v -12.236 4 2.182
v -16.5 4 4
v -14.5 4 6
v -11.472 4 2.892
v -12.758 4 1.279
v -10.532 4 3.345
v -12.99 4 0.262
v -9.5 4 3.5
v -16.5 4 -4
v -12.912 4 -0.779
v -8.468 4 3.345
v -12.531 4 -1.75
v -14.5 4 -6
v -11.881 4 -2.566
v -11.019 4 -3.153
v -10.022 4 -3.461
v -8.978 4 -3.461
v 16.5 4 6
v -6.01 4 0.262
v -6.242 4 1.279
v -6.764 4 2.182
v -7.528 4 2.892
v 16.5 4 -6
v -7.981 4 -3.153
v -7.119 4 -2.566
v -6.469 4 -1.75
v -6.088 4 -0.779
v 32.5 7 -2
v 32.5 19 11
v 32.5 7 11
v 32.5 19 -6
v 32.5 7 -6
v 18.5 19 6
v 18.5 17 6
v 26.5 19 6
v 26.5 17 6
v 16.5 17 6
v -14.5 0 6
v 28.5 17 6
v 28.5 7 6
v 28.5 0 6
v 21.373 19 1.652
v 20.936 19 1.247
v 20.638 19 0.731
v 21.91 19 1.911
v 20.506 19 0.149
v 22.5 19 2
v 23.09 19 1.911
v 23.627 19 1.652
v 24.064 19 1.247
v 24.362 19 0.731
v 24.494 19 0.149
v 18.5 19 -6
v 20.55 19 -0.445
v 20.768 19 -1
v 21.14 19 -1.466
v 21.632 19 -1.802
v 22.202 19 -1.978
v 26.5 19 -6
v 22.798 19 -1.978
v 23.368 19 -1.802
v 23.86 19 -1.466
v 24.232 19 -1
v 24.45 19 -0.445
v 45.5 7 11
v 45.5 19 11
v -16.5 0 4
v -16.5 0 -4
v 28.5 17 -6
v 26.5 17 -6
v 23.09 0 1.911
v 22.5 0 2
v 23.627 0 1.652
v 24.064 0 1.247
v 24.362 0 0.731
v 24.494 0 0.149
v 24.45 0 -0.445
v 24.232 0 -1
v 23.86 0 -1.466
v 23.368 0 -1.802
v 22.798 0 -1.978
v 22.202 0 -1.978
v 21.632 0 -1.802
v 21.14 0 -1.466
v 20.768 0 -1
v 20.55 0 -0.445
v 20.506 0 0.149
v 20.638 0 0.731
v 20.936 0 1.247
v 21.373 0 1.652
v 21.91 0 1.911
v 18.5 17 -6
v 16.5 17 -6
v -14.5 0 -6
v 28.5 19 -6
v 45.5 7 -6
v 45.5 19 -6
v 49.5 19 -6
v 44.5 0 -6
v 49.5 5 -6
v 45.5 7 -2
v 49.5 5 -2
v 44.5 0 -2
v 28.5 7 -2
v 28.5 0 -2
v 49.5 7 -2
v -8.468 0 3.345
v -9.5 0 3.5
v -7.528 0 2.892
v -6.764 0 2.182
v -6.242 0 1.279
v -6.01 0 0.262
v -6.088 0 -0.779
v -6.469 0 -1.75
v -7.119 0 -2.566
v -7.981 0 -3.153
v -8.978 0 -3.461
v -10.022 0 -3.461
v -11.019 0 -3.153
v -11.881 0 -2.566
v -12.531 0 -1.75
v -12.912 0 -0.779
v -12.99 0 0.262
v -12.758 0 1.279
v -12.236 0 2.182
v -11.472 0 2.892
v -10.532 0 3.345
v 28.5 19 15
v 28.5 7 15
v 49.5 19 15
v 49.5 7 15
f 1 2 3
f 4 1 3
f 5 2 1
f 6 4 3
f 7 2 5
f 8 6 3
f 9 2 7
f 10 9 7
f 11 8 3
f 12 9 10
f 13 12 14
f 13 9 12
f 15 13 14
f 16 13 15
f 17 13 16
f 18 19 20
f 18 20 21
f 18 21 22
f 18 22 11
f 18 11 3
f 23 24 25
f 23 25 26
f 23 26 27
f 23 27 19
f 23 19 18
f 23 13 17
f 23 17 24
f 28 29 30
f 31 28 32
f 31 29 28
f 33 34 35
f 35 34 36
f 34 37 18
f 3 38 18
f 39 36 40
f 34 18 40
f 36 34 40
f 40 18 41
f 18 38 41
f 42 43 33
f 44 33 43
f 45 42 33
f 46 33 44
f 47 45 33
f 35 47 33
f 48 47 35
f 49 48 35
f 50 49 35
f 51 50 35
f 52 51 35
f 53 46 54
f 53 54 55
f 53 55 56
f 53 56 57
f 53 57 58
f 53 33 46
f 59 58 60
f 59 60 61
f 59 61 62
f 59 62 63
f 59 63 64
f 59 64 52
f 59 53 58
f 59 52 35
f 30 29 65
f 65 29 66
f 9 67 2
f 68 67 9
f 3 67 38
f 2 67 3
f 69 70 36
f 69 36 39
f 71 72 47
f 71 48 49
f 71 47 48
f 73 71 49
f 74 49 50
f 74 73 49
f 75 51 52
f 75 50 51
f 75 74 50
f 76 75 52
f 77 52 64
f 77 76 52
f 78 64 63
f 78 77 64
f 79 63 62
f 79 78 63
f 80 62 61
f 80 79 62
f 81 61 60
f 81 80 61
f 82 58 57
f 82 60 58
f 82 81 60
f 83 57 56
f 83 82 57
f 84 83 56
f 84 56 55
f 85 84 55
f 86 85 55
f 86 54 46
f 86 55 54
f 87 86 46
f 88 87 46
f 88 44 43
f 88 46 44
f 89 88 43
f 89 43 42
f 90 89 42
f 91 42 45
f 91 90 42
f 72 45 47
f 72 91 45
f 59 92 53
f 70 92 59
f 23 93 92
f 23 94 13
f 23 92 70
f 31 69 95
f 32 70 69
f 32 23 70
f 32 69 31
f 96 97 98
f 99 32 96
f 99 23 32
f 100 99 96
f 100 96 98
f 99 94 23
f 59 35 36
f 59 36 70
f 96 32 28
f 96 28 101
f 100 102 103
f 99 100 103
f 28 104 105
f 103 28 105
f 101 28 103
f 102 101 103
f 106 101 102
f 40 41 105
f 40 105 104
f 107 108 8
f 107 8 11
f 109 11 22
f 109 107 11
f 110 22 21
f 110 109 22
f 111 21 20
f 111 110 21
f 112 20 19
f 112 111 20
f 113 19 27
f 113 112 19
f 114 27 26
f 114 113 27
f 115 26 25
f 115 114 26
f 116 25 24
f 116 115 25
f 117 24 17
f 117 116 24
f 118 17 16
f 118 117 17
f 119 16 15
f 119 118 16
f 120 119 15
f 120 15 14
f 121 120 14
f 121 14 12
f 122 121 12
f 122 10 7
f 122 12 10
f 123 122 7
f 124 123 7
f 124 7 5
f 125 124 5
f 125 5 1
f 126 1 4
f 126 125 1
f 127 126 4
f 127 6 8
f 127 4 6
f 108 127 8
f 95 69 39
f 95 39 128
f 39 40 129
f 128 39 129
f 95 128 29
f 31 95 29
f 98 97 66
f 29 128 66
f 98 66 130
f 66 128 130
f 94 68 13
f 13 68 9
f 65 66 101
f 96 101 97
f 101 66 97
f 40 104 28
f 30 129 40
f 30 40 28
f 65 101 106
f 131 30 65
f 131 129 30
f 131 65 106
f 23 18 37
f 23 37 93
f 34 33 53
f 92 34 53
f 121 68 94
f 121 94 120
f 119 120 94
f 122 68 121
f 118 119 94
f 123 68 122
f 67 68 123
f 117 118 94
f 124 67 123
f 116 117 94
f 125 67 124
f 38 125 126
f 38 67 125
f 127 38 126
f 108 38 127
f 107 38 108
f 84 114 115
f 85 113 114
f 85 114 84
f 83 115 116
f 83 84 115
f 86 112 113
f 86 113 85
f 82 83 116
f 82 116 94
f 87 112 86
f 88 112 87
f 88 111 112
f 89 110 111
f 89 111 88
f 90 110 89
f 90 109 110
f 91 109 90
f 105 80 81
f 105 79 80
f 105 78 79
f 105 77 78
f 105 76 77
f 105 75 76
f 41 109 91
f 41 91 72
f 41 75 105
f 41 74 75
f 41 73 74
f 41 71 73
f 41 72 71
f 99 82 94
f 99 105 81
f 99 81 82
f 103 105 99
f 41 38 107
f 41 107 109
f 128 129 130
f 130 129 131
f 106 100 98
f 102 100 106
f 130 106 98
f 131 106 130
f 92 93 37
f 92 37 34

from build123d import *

# Parameters (mm, degrees)
SKETCH_1_W               = 33
SKETCH_1_H               = 12
EXTRUDE_1_DEPTH          = 4
SKETCH_1_3_W             = 12
SKETCH_1_3_H             = 12
EXTRUDE_2_DEPTH          = 19
SKETCH_2_W               = 2
SKETCH_2_H               = 12
CUT_EXTRUDE_1_DEPTH      = 2
SKETCH_3_W               = 21
SKETCH_3_H               = 21
EXTRUDE_3_DEPTH          = 19
CUT_EXTRUDE_2_DEPTH      = 58.028501646
SKETCH_5_W               = 13
SKETCH_5_H               = 13
CUT_EXTRUDE_3_DEPTH      = 56.102177815
SKETCH_6_W               = 13
SKETCH_6_H               = 4
CUT_EXTRUDE_4_DEPTH      = 12
SKETCH_7_W               = 21
SKETCH_7_H               = 7
CUT_EXTRUDE_5_DEPTH      = 17
CUT_EXTRUDE_6_DEPTH      = 54.853969213
CUT_EXTRUDE_6_DEPTH_BACK = 54.853969213
SKETCH_8_R               = 3.5
CUT_EXTRUDE_7_DEPTH      = 56.102177815
CUT_EXTRUDE_7_DEPTH_BACK = 56.102177815
SKETCH_9_R               = 2
CHAMFER_1_SIZE           = 2


with BuildPart() as part:
    # 草图1 → 凸台-拉伸1 (new body)
    with BuildSketch(Plane(origin=(0, 0, 0), x_dir=(1, 0, 0), z_dir=(0, 1, 0))):
        Rectangle(SKETCH_1_W, SKETCH_1_H)
    extrude(amount=EXTRUDE_1_DEPTH)

    # 草图1<3> → 凸台-拉伸2 (add)
    with BuildSketch(Plane(origin=(0, 0, 0), x_dir=(1, 0, 0), z_dir=(0, 1, 0))):
        with Locations((22.5, 0)):
            Rectangle(SKETCH_1_3_W, SKETCH_1_3_H)
    extrude(amount=EXTRUDE_2_DEPTH)

    # 草图2 → 切除-拉伸1 (cut)
    with BuildSketch(Plane(origin=(0, 19, 0), x_dir=(1, 0, 0), z_dir=(0, 1, 0))):
        with Locations((17.5, 0)):
            Rectangle(SKETCH_2_W, SKETCH_2_H)
        with Locations((27.5, 0)):
            Rectangle(SKETCH_2_W, SKETCH_2_H)
    extrude(amount=-CUT_EXTRUDE_1_DEPTH, mode=Mode.SUBTRACT)

    # 草图3 → 凸台-拉伸3 (add)
    with BuildSketch(Plane.XZ):
        with Locations((39, 4.5)):
            Rectangle(SKETCH_3_W, SKETCH_3_H)
    extrude(amount=-EXTRUDE_3_DEPTH)

    # 草图4 → 切除-拉伸2 (cut, through all)
    with BuildSketch(Plane.XY.offset(15)):
        Polygon((49.5, 5), (44.5, 0), (49.5, 0), align=None)
    extrude(amount=-CUT_EXTRUDE_2_DEPTH, mode=Mode.SUBTRACT)

    # 草图5 → 切除-拉伸3 (cut, through all)
    with BuildSketch(Plane(origin=(0, 19, 0), x_dir=(1, 0, 0), z_dir=(0, 1, 0))):
        with Locations((39, -4.5)):
            Rectangle(SKETCH_5_W, SKETCH_5_H)
    extrude(amount=-CUT_EXTRUDE_3_DEPTH, mode=Mode.SUBTRACT)

    # 草图6 → 切除-拉伸4 (cut)
    with BuildSketch(Plane(origin=(0, 19, 0), x_dir=(1, 0, 0), z_dir=(0, 1, 0))):
        with Locations((39, 4)):
            Rectangle(SKETCH_6_W, SKETCH_6_H)
    extrude(amount=-CUT_EXTRUDE_4_DEPTH, mode=Mode.SUBTRACT)

    # 草图7 → 切除-拉伸5 (cut)
    with BuildSketch(Plane.XY.offset(15)):
        with Locations((39, 3.5)):
            Rectangle(SKETCH_7_W, SKETCH_7_H)
    extrude(amount=-CUT_EXTRUDE_5_DEPTH, mode=Mode.SUBTRACT)

    # 草图8 → 切除-拉伸6 (cut, two sides: drawn at the far end of the back side and taken through both)
    with BuildSketch(Plane(origin=(0, 4, 0), x_dir=(1, 0, 0), z_dir=(0, 1, 0)).offset(-CUT_EXTRUDE_6_DEPTH_BACK)):
        with Locations(Location((-9.5, 0, 0), (0, 0, 270))):
            Circle(SKETCH_8_R)
    extrude(amount=CUT_EXTRUDE_6_DEPTH + CUT_EXTRUDE_6_DEPTH_BACK, mode=Mode.SUBTRACT)

    # 草图9 → 切除-拉伸7 (cut, two sides: drawn at the far end of the back side and taken through both)
    with BuildSketch(Plane(origin=(0, 19, 0), x_dir=(1, 0, 0), z_dir=(0, 1, 0)).offset(-CUT_EXTRUDE_7_DEPTH_BACK)):
        with Locations(Location((22.5, 0, 0), (0, 0, 270))):
            Circle(SKETCH_9_R)
    extrude(amount=CUT_EXTRUDE_7_DEPTH + CUT_EXTRUDE_7_DEPTH_BACK, mode=Mode.SUBTRACT)

    # 倒角1
    chamfer_1_edges = [part.edges().sort_by_distance(p)[0] for p in [
        (-16.5, 2, 6),
        (-16.5, 2, -6),
    ]]
    chamfer(chamfer_1_edges, length=CHAMFER_1_SIZE)


solid = part.part
